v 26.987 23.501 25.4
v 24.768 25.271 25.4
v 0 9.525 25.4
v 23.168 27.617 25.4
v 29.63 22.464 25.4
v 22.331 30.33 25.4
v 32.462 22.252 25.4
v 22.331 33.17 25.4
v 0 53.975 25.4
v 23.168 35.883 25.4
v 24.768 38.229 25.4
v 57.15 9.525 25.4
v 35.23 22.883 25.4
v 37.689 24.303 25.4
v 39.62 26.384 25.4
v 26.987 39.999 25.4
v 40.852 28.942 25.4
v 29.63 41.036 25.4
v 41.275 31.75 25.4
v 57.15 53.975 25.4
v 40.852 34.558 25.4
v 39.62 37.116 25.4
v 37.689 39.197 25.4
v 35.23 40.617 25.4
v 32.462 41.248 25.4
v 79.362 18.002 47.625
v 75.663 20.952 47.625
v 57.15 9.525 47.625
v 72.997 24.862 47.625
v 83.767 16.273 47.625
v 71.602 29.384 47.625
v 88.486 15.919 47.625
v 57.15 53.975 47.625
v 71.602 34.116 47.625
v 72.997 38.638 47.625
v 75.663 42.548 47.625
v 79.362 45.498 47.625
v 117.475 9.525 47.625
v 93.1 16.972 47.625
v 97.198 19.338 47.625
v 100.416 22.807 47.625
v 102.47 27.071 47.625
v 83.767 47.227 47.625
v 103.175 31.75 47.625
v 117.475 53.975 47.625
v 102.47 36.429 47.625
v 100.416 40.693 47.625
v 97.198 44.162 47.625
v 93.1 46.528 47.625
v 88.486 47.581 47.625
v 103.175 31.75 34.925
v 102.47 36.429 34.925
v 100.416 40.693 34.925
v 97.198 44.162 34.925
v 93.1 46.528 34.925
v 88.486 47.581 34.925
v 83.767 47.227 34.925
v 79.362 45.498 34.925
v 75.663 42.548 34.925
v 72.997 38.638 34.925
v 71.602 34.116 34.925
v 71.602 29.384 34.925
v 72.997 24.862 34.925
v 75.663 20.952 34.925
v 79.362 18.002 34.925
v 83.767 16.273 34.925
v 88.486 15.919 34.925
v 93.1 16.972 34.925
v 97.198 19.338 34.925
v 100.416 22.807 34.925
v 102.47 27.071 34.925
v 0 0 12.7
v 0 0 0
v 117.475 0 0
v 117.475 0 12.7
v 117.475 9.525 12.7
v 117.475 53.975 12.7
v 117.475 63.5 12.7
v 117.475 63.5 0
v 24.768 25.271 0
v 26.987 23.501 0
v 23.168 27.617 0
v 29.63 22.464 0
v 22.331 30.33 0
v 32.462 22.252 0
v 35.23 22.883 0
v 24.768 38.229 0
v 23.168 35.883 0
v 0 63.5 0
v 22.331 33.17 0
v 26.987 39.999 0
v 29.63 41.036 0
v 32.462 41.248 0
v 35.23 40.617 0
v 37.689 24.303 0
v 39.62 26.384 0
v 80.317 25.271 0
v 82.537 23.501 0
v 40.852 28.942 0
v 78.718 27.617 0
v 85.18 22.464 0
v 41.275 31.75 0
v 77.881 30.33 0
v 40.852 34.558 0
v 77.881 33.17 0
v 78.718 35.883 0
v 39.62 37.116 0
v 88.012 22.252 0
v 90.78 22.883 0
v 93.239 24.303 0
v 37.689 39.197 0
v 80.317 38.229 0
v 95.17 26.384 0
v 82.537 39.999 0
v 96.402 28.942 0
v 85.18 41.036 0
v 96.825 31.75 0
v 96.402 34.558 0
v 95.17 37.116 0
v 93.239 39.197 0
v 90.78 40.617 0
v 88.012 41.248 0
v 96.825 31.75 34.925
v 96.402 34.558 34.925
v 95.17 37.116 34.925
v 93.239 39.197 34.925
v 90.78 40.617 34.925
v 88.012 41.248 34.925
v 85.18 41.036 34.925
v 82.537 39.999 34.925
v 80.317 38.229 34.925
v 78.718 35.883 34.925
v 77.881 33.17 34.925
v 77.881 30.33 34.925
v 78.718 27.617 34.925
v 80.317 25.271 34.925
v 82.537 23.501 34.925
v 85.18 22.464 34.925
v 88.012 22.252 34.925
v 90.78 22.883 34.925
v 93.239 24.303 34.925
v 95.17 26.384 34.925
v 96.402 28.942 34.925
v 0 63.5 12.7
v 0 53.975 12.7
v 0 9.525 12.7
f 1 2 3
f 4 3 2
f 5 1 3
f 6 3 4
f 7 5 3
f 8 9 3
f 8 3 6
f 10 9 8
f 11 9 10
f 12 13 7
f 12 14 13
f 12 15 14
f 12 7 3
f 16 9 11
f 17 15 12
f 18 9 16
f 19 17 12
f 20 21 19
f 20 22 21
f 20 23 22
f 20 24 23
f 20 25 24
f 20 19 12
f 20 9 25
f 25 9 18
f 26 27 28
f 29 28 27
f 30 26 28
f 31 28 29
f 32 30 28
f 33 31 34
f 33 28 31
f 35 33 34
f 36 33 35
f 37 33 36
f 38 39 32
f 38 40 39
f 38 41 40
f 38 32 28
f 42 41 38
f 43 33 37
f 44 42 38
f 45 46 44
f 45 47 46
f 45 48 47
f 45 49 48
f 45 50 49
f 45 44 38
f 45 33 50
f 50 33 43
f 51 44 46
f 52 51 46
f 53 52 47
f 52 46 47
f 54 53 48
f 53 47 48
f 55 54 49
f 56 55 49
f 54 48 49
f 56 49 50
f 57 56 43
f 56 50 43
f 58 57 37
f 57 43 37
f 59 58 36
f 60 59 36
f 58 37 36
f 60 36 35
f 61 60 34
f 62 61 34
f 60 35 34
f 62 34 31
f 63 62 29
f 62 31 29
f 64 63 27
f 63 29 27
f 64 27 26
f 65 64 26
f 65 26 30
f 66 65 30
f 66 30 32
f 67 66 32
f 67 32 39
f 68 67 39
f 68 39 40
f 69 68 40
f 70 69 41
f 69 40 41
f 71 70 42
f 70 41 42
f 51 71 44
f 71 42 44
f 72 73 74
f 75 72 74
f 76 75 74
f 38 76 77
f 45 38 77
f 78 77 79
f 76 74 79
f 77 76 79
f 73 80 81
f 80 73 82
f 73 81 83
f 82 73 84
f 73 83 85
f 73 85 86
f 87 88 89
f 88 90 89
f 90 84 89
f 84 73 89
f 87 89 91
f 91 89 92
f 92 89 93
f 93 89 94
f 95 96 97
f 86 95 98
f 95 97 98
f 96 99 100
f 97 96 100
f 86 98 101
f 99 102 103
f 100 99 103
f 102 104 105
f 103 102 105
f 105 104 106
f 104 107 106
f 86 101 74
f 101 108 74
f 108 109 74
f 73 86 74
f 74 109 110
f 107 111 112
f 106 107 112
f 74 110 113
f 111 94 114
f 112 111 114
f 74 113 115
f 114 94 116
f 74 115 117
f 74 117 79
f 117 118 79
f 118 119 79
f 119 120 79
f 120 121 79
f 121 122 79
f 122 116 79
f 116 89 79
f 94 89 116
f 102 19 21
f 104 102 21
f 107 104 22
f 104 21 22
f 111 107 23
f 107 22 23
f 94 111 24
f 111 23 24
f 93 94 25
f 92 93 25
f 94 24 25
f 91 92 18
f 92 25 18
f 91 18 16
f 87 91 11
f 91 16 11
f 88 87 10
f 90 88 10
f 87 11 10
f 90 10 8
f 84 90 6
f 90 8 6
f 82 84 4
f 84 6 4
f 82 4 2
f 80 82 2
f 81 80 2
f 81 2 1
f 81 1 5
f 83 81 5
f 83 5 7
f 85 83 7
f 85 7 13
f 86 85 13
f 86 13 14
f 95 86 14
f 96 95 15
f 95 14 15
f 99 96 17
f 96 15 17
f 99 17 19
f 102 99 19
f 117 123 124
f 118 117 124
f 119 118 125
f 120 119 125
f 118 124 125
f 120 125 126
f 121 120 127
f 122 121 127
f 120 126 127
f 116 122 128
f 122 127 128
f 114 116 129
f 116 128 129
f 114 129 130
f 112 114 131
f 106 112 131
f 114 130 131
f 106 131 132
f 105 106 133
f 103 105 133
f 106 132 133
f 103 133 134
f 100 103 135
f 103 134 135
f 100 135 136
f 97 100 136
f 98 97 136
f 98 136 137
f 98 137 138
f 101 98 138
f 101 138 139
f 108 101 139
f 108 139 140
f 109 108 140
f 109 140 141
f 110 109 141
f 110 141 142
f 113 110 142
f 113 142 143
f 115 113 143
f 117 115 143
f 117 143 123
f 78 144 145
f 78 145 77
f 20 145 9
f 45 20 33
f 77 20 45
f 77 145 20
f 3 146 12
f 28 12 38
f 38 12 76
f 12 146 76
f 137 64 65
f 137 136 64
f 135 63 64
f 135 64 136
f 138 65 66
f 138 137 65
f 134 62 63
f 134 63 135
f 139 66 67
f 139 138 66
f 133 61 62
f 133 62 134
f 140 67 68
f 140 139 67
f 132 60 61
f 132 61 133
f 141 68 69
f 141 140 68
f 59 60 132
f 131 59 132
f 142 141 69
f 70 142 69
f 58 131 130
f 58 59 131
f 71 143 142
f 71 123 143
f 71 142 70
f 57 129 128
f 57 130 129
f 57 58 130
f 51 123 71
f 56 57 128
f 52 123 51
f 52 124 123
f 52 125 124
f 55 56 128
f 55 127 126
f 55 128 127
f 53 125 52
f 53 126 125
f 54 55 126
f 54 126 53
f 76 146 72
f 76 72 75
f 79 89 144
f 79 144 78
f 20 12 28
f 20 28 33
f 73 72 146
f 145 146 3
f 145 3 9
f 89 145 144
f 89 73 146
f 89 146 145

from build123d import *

# Parameters (mm, degrees)
F0_W      = 117.475
F0_H      = 63.5
F1_DEPTH  = 12.7
F2_W      = 57.15
F2_H      = 44.45
F3_DEPTH  = 12.7
F4_W      = 60.325
F4_H      = 44.45
F5_DEPTH  = 34.925
F6_R      = 9.525
F7_DEPTH  = 25.4
F8_R      = 15.875
F9_DEPTH  = 12.7
F10_R     = 9.525
F11_DEPTH = 50.8


with BuildPart() as f1:
    # F0 (on Top) → F1 (new body)
    with BuildSketch(Plane.XY):
        with Locations((58.7375, 31.75)):
            Rectangle(F0_W, F0_H)
    extrude(amount=F1_DEPTH)

    # F2 (on face) → F3 (join)
    with BuildSketch(Plane.XY.offset(12.7)):
        with Locations((28.575, 31.75)):
            Rectangle(F2_W, F2_H)
    extrude(amount=F3_DEPTH)

    # F4 (on face) → F5 (join)
    with BuildSketch(Plane.XY.offset(12.7)):
        with Locations((87.3125, 31.75)):
            Rectangle(F4_W, F4_H)
    extrude(amount=F5_DEPTH)

    # F6 (on face) → F7 (cut)
    with BuildSketch(Plane.XY.offset(25.4)):
        with Locations((31.75, 31.75)):
            Circle(F6_R)
    extrude(amount=-F7_DEPTH, mode=Mode.SUBTRACT)

    # F8 (on face) → F9 (cut)
    with BuildSketch(Plane.XY.offset(47.625)):
        with Locations((87.2998, 31.75)):
            Circle(F8_R)
    extrude(amount=-F9_DEPTH, mode=Mode.SUBTRACT)

    # F10 (on face) → F11 (cut)
    with BuildSketch(Plane.XY.offset(34.925)):
        with Locations((87.2998, 31.75)):
            Circle(F10_R)
    extrude(amount=-F11_DEPTH, mode=Mode.SUBTRACT)


solid = f1.part
